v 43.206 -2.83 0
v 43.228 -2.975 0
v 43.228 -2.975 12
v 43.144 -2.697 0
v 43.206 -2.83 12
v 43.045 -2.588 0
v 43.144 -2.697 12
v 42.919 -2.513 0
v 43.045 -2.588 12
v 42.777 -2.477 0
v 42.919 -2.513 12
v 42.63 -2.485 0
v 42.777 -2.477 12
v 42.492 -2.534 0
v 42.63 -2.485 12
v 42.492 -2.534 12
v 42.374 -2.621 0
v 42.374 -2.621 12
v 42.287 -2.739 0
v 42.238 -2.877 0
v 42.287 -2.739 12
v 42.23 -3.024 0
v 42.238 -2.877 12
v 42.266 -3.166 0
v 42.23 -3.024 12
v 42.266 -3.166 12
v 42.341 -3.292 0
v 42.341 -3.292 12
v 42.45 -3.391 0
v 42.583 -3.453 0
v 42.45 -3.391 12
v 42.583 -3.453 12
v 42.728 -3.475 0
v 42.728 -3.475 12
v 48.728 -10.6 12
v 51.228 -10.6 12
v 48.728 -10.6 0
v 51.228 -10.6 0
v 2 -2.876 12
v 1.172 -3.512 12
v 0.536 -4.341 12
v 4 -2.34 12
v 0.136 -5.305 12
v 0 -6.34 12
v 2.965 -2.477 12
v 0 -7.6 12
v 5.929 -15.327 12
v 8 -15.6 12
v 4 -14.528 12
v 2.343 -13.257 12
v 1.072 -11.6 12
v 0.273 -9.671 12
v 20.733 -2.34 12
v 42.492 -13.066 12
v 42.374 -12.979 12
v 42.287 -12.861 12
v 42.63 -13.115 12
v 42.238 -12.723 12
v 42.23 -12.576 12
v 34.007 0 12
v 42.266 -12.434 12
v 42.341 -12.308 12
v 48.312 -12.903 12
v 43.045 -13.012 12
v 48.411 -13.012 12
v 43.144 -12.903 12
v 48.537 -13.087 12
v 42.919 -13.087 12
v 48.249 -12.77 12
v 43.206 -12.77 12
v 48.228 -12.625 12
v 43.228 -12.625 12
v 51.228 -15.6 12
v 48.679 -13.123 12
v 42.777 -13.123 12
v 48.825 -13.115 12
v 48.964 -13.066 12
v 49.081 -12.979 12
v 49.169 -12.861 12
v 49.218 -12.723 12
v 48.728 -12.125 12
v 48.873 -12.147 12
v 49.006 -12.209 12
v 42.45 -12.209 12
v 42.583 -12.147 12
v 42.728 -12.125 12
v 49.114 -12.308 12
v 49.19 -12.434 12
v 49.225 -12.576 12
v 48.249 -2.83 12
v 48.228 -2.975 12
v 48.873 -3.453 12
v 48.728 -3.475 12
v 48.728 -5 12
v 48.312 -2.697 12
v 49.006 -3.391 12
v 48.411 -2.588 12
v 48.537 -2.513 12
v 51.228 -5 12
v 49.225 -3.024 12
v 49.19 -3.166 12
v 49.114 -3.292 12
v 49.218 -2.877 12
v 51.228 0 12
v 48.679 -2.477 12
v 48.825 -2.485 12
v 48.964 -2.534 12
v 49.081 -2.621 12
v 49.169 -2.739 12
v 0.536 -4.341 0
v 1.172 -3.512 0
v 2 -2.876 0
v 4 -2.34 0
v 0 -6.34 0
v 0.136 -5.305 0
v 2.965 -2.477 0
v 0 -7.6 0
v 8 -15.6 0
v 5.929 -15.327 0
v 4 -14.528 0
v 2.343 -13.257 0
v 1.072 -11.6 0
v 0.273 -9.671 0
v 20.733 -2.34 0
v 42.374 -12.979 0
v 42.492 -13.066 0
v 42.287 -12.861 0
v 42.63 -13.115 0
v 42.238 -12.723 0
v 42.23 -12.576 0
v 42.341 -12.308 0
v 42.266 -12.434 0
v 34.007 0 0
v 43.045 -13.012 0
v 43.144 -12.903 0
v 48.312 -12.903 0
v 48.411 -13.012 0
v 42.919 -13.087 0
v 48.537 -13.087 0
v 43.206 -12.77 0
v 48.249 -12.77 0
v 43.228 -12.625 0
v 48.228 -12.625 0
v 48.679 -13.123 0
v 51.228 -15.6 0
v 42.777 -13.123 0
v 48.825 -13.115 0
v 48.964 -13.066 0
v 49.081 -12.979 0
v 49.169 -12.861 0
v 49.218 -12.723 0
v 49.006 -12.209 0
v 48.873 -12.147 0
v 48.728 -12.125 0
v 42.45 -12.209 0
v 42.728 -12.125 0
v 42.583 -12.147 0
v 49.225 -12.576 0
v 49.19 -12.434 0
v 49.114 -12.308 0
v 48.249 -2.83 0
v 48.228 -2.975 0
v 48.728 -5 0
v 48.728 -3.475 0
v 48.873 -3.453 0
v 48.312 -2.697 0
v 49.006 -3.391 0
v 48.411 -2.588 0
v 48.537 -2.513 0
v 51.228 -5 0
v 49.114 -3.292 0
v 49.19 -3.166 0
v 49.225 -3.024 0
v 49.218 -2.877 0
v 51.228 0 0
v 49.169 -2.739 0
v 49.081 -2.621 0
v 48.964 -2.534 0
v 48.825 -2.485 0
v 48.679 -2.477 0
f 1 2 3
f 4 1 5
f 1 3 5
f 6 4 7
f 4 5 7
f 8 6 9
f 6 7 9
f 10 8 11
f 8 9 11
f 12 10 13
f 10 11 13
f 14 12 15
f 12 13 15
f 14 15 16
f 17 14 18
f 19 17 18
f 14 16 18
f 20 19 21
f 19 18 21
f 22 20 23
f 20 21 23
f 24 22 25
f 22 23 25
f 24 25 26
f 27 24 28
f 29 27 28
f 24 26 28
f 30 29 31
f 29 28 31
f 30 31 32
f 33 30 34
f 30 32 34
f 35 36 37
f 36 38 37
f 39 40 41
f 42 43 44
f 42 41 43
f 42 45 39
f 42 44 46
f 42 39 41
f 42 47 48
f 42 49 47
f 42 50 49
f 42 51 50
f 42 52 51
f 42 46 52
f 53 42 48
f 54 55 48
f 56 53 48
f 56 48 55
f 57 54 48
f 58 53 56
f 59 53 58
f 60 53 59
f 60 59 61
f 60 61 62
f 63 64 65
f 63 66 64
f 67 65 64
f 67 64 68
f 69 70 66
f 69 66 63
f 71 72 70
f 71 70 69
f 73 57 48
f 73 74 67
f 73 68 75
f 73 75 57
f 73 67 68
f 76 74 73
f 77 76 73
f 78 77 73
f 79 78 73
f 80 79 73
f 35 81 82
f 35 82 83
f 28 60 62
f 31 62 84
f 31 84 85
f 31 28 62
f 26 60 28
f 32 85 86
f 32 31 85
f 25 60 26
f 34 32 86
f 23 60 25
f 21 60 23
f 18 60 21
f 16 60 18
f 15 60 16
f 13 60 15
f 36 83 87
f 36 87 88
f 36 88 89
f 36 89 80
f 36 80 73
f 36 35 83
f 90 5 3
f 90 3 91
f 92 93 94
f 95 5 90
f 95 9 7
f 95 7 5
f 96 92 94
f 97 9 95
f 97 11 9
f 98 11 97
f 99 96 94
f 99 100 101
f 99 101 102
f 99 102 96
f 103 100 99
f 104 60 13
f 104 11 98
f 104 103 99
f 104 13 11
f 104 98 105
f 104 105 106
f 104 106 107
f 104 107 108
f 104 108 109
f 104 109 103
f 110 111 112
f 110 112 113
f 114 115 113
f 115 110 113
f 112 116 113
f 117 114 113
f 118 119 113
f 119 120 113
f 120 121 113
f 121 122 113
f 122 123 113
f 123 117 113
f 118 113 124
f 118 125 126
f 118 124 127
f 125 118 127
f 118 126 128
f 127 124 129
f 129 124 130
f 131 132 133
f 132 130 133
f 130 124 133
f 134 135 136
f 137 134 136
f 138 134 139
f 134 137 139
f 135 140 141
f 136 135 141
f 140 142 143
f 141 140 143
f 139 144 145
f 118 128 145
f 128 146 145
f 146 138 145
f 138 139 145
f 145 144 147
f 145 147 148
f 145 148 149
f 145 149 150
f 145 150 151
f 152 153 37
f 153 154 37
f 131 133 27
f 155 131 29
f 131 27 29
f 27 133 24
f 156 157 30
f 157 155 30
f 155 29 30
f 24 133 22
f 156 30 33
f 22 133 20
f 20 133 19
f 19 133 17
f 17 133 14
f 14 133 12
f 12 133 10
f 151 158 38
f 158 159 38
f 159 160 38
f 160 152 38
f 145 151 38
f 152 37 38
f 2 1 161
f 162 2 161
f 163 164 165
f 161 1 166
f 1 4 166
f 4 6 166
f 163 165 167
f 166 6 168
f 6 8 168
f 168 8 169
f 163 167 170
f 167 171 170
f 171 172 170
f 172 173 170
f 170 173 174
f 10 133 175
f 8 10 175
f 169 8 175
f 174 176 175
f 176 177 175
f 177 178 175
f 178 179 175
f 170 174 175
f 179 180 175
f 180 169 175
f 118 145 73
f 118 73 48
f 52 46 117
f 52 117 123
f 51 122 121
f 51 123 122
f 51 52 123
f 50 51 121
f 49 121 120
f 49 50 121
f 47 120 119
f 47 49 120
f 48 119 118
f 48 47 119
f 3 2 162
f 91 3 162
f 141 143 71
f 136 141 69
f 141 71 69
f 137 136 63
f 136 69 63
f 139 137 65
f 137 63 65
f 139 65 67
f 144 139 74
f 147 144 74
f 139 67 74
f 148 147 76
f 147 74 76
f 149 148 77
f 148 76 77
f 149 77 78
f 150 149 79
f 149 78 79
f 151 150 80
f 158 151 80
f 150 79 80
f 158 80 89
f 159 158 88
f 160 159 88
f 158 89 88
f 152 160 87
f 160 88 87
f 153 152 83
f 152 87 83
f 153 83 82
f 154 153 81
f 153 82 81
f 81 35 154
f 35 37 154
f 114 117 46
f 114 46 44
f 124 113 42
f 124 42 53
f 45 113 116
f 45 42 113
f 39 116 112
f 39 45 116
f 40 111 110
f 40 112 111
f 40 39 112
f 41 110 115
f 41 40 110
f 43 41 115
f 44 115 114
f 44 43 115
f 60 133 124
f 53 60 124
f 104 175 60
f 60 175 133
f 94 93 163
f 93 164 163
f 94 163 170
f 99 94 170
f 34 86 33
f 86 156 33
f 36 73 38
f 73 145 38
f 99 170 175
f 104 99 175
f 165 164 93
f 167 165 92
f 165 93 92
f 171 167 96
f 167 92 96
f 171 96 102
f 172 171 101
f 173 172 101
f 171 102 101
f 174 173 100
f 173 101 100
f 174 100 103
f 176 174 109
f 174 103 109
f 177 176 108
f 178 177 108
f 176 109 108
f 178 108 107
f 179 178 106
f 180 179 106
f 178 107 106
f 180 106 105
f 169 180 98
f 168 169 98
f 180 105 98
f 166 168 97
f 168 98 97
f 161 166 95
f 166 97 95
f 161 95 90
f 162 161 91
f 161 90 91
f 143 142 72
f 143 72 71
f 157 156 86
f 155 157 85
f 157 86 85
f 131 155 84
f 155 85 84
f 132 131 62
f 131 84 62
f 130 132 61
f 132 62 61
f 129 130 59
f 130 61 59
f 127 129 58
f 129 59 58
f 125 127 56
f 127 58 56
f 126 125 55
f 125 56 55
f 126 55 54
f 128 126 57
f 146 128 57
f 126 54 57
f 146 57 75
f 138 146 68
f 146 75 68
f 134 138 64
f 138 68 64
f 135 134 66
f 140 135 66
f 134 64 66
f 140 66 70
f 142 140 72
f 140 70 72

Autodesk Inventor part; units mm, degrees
ref_plane "YZ Plane" through (0, 0, 0) normal (1, 0, 0) x (0, 1, 0)
ref_plane "XZ Plane" through (0, 0, 0) normal (0, 1, 0) x (-1, 0, 0)
ref_plane "XY Plane" through (0, 0, 0) normal (0, 0, 1) x (1, 0, 0)
sketch "Sketch5" plane through (0, 0, 0) normal (0, 0, 1) x (1, 0, 0)
  line L0 (51.2279, -15.6) -> (51.2279, -10.6)
  line L1 (51.2279, -10.6) -> (48.7279, -10.6)
  line L2 (48.7279, -10.6) -> (48.7279, -12.625)
  line L3 (42.7279, -12.625) -> (42.7279, -2.975)
  line L4 (48.7279, -2.975) -> (48.7279, -5)
  line L5 (48.7279, -5) -> (51.2279, -5)
  line L6 (51.2279, -5) -> (51.2279, 0)
  line L7 (42.7279, -2.975) -> (48.7279, -2.975)
  line L8 (42.7279, -12.625) -> (48.7279, -12.625)
  line L9 (51.2279, -15.6) -> (43.6357, -15.6)
  line L10 (39.8786, -15.6) -> (43.6357, -15.6)
  line L11 (0, -15.6) -> (39.8786, -15.6)
  line L12 (36.9909, 0) -> (51.2279, 0)
  line L13 (0, -15.6) -> (0, -5.4692)
  line L14 (36.9909, 0) -> (31.0226, 0)
  line L15 (34.0067, 0) -> (20.7329, -2.3405)
  line L16 (0, -5.4692) -> (0, -2.3405)
  line L17 (0, -2.3405) -> (20.7329, -2.3405)
  point P0 (0, 0)
  point P1 (44.1094, 0)
  dimension "d41" = 6
  dimension "d50" = 2.5
  dimension "d87" = 5.6
  dimension "d88" = 9.65
  dimension "d122" = 14.237
  dimension "d123" = 2.975
  dimension "d132" = 10
extrude "Extrusion2" add sketch "Sketch5" along normal blind 12
sketch "Sketch11" plane through (0, 0, 12) normal (0, 0, 1) x (1, 0, 0)
  line L0 (42.7279, -2.975) -> (48.7279, -2.975) projected
  circle A0 centre (42.7279, -2.975) radius 0.5
  line L1 (42.7279, -12.625) -> (42.7279, -2.975) projected
  circle A1 centre (42.7279, -12.625) radius 0.5
  line L2 (48.7279, -12.625) -> (42.7279, -12.625) projected
  circle A2 centre (48.7279, -12.625) radius 0.5
  line L3 (48.7279, -2.975) -> (48.7279, -5) projected
  circle A3 centre (48.7279, -2.975) radius 0.5
  point P0 (0, 0)
  dimension "d99" = 1
  dimension "d100" = 1
  dimension "d101" = 1
  dimension "d102" = 1
extrude "Extrusion7" cut sketch "Sketch11" against normal through all
fillet "Rundung4" radius 8 1 edges at (0, -15.6, 6)
sketch "Skizze13" plane through (0, 0, 0) normal (-1, 0, 0) x (0, 0, 1)
  point P0 (0, 0)
fillet "Rundung7" radius 4 1 edges at (0, -2.3405, 6)
equation "\"l1\" = 8"
properties part number "Maria_Greifer_Dreieck2_3D-Druck"
